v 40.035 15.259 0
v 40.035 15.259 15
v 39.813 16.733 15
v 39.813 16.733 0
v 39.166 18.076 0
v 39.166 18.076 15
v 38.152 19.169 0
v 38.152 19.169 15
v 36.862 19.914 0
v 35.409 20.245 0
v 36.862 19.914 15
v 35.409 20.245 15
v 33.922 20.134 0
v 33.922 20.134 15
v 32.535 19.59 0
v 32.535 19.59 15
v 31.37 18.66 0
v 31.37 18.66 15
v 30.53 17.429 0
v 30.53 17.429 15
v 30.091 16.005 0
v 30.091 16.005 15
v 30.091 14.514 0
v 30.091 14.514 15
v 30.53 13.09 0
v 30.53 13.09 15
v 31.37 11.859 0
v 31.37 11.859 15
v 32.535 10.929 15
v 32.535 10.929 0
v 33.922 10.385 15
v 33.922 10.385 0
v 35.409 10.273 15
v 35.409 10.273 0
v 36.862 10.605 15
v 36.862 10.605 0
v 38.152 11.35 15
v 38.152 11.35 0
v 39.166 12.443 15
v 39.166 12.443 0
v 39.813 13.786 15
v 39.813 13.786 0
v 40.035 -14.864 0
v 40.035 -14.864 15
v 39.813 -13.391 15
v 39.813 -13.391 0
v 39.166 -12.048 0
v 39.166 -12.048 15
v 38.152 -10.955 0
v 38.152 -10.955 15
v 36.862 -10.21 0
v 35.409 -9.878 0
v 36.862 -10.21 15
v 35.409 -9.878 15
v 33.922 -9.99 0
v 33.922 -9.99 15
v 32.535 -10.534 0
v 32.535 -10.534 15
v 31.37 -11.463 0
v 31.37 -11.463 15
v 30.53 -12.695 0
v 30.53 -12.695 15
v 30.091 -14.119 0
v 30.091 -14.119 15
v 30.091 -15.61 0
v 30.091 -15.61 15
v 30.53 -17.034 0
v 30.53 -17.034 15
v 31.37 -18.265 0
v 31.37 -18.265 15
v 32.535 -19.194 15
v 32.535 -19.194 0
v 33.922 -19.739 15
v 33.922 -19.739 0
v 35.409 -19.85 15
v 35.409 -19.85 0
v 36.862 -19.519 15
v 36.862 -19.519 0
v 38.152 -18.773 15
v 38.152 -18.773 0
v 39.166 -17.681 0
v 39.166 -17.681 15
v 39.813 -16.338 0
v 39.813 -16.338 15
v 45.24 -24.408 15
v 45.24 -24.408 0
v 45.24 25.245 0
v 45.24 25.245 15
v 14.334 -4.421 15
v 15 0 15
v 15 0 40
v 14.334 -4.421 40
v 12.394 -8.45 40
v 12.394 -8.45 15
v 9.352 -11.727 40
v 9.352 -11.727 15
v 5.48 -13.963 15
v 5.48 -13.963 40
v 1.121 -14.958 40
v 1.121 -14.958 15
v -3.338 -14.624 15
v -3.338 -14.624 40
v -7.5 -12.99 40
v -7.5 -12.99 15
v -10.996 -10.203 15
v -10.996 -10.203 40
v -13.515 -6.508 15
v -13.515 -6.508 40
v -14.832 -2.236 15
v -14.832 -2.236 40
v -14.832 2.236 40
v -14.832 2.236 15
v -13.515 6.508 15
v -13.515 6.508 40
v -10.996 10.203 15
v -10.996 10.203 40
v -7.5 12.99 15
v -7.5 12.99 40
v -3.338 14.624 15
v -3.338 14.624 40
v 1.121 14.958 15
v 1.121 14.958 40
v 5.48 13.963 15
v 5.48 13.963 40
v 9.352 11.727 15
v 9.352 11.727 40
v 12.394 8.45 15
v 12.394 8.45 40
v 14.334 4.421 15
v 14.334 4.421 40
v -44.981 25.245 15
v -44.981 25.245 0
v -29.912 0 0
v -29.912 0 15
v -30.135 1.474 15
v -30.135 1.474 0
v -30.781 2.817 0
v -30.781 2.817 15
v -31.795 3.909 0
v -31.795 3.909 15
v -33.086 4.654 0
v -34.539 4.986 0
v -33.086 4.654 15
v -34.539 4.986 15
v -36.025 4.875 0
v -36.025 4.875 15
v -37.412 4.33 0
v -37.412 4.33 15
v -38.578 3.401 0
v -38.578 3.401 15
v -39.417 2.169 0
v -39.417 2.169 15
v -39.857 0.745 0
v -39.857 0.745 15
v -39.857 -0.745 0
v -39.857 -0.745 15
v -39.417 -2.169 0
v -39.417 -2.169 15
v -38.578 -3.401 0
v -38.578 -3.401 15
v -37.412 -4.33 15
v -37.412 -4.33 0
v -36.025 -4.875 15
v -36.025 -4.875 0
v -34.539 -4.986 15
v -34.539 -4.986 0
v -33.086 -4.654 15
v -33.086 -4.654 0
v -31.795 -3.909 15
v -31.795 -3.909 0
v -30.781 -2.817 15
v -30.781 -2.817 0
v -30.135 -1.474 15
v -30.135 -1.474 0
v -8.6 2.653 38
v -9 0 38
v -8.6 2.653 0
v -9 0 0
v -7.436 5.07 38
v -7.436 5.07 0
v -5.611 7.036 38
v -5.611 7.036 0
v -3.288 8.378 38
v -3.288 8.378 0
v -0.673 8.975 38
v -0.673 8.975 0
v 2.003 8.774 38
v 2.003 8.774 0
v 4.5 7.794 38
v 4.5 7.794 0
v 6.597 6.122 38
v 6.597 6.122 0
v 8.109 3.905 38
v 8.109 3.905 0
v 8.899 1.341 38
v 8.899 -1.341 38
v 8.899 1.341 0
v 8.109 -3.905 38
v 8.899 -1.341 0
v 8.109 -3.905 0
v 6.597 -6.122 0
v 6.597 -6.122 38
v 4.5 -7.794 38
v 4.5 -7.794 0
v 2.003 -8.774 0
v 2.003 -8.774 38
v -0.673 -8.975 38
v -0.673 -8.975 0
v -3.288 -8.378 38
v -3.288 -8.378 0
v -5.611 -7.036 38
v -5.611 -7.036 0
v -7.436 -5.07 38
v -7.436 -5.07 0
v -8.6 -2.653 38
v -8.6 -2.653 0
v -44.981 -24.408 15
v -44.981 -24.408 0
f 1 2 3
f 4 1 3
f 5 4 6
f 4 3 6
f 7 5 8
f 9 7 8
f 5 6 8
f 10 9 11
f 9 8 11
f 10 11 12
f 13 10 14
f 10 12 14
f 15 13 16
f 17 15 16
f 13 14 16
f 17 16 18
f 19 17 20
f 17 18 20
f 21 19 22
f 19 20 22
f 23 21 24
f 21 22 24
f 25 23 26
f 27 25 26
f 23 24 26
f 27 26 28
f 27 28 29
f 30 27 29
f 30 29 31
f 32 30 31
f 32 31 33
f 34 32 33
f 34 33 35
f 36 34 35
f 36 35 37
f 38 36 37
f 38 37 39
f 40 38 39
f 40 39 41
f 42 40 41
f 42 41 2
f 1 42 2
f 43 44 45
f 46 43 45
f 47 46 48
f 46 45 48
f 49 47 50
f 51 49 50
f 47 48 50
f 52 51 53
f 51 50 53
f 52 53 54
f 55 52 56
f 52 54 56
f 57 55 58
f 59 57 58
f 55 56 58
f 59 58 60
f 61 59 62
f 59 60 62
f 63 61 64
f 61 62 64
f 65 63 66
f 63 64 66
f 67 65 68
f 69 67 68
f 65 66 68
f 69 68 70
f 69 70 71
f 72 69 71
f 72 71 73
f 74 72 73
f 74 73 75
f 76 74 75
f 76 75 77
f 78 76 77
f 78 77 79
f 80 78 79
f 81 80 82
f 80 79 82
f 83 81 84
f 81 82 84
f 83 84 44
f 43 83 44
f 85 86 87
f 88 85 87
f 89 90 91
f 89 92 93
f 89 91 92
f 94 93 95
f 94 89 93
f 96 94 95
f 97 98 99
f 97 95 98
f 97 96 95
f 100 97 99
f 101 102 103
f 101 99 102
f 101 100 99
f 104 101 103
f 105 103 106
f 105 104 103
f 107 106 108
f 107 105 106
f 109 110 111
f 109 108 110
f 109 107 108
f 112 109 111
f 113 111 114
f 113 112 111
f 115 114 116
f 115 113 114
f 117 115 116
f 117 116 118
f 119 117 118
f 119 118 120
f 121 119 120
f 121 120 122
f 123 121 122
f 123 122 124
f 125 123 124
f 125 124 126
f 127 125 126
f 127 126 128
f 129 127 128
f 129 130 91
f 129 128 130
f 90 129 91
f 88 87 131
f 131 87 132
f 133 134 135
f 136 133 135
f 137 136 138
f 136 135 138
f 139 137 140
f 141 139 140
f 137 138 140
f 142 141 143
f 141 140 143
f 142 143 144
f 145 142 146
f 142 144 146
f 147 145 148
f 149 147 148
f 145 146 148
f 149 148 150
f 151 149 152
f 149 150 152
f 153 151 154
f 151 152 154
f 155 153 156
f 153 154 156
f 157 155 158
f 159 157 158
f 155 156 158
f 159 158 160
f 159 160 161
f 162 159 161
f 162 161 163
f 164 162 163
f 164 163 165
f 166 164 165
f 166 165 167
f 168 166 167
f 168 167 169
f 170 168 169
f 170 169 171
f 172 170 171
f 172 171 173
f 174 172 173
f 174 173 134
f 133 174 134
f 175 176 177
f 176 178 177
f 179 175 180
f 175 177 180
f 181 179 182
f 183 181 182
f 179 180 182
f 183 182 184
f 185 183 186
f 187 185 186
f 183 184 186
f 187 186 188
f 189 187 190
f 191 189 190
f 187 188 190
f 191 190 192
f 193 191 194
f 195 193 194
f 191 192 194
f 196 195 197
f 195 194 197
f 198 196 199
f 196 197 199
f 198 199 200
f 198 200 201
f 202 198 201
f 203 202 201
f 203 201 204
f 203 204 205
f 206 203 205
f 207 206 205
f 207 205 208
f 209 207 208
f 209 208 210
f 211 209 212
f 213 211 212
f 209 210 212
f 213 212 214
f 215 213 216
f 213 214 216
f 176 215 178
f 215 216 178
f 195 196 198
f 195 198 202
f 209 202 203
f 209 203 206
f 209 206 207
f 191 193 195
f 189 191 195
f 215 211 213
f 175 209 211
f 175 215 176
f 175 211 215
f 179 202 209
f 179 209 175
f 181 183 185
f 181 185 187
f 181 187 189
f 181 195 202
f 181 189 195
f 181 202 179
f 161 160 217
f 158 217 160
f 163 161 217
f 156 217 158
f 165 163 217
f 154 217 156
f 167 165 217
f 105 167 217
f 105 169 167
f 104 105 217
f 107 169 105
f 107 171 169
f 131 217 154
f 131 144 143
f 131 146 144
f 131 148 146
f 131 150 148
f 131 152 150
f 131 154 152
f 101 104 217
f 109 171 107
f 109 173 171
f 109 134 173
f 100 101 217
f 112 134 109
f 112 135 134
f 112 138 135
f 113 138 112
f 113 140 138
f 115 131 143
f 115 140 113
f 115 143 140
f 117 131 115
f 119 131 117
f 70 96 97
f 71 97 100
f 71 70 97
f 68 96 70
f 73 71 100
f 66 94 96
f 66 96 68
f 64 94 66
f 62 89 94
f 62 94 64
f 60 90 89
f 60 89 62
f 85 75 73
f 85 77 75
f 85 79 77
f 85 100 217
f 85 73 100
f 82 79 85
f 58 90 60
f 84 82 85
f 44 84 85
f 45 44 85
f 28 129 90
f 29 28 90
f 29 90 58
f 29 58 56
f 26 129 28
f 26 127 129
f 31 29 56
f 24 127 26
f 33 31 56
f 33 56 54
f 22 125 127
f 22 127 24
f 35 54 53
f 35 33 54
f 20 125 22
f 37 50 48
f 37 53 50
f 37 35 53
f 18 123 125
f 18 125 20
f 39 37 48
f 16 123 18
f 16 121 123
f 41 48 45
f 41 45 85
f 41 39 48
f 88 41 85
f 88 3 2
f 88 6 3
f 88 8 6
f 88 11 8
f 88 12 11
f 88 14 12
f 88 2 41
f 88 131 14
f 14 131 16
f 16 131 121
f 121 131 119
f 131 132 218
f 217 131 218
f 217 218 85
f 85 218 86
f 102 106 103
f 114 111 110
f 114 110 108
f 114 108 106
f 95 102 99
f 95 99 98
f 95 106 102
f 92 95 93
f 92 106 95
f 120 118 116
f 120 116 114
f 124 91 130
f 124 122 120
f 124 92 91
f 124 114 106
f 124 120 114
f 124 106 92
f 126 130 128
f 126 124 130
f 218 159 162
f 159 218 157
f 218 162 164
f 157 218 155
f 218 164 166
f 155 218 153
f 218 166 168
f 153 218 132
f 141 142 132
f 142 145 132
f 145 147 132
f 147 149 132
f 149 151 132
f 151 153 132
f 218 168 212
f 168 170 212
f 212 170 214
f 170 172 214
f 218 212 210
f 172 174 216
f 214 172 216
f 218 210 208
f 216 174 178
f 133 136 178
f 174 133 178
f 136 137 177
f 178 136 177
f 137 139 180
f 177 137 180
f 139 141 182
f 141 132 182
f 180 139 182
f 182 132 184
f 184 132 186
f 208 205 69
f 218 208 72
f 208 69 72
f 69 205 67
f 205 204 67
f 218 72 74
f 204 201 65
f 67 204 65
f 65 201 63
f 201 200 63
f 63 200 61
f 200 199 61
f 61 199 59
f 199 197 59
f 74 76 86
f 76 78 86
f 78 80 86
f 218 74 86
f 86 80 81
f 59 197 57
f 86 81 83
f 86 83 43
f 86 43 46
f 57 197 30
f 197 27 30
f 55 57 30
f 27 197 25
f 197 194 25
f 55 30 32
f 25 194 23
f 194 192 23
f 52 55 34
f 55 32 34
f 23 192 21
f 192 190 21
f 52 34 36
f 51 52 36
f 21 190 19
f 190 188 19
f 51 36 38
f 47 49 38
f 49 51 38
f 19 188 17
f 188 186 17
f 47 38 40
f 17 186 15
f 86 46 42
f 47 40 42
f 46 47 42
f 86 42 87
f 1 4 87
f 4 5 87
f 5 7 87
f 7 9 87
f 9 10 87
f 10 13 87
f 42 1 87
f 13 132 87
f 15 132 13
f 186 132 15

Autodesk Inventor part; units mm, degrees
ref_plane "YZ Plane" through (0, 0, 0) normal (1, 0, 0) x (0, 1, 0)
ref_plane "XZ Plane" through (0, 0, 0) normal (0, 1, 0) x (-1, 0, 0)
ref_plane "XY Plane" through (0, 0, 0) normal (0, 0, 1) x (1, 0, 0)
sketch "Эскиз4" plane through (0, 0, 0) normal (0, 0, 1) x (1, 0, 0)
  line L0 (45.2395, 25.2453) -> (-44.981, 25.2453)
  line L1 (-44.981, 25.2453) -> (-44.981, -24.4084)
  line L2 (-44.981, -24.4084) -> (45.2395, -24.4084)
  line L3 (45.2395, -24.4084) -> (45.2395, 25.2453)
  point P0 (0, 0)
extrude "Прямоугольник_" add sketch "Эскиз4" along normal blind 15
sketch "Прямоугольник" plane through (0, 0, 0) normal (0, 0, 1) x (1, 0, 0)
  line L0 (-77.4921, 158.0418) -> (133.4103, 158.0418) construction
  line L1 (133.4103, 158.0418) -> (133.4103, -71.9132) construction
  line L2 (133.4103, -71.9132) -> (-77.4921, -71.9132) construction
  line L3 (-77.4921, -71.9132) -> (-77.4921, 158.0418) construction
  line L4 (44.9907, 25.2614) -> (-45.0093, 25.2614)
  line L5 (-45.0093, 25.2614) -> (-45.0093, -24.7386)
  line L6 (-45.0093, -24.7386) -> (44.9907, -24.7386)
  line L7 (44.9907, -24.7386) -> (44.9907, 25.2614)
  point P0 (0, 0)
  dimension "d17" = 90
  dimension "d20" = 50
sketch "Три отверстия по краям" plane through (0, 0, 15) normal (0, 0, 1) x (1, 0, 0)
  circle A0 centre (-34.9124, 0) radius 5
  circle A1 centre (35.035, 15.2594) radius 5
  circle A2 centre (35.035, -14.8643) radius 5
  point P0 (0, 0)
  dimension "d12" = 10
  dimension "d13" = 10
  dimension "d14" = 10
extrude "3 отверстия по краям" cut sketch "Три отверстия по краям" against normal blind 800
sketch "Возвышенность по центру" plane through (0, 0, 15) normal (0, 0, 1) x (1, 0, 0)
  circle A0 centre (0, 0) radius 15
  dimension "d21" = 30
extrude "Возвышенность" add sketch "Возвышенность по центру" along normal blind 25
sketch "Эскиз7" plane through (0, 0, 0) normal (0, 0, -1) x (-1, 0, 0)
  circle A0 centre (0, 0) radius 9
  dimension "d24" = 18
extrude "Внутренняя часть внутри возв" cut sketch "Эскиз7" against normal blind 38
properties part number "Основание БЕЗ опор по бокам"
